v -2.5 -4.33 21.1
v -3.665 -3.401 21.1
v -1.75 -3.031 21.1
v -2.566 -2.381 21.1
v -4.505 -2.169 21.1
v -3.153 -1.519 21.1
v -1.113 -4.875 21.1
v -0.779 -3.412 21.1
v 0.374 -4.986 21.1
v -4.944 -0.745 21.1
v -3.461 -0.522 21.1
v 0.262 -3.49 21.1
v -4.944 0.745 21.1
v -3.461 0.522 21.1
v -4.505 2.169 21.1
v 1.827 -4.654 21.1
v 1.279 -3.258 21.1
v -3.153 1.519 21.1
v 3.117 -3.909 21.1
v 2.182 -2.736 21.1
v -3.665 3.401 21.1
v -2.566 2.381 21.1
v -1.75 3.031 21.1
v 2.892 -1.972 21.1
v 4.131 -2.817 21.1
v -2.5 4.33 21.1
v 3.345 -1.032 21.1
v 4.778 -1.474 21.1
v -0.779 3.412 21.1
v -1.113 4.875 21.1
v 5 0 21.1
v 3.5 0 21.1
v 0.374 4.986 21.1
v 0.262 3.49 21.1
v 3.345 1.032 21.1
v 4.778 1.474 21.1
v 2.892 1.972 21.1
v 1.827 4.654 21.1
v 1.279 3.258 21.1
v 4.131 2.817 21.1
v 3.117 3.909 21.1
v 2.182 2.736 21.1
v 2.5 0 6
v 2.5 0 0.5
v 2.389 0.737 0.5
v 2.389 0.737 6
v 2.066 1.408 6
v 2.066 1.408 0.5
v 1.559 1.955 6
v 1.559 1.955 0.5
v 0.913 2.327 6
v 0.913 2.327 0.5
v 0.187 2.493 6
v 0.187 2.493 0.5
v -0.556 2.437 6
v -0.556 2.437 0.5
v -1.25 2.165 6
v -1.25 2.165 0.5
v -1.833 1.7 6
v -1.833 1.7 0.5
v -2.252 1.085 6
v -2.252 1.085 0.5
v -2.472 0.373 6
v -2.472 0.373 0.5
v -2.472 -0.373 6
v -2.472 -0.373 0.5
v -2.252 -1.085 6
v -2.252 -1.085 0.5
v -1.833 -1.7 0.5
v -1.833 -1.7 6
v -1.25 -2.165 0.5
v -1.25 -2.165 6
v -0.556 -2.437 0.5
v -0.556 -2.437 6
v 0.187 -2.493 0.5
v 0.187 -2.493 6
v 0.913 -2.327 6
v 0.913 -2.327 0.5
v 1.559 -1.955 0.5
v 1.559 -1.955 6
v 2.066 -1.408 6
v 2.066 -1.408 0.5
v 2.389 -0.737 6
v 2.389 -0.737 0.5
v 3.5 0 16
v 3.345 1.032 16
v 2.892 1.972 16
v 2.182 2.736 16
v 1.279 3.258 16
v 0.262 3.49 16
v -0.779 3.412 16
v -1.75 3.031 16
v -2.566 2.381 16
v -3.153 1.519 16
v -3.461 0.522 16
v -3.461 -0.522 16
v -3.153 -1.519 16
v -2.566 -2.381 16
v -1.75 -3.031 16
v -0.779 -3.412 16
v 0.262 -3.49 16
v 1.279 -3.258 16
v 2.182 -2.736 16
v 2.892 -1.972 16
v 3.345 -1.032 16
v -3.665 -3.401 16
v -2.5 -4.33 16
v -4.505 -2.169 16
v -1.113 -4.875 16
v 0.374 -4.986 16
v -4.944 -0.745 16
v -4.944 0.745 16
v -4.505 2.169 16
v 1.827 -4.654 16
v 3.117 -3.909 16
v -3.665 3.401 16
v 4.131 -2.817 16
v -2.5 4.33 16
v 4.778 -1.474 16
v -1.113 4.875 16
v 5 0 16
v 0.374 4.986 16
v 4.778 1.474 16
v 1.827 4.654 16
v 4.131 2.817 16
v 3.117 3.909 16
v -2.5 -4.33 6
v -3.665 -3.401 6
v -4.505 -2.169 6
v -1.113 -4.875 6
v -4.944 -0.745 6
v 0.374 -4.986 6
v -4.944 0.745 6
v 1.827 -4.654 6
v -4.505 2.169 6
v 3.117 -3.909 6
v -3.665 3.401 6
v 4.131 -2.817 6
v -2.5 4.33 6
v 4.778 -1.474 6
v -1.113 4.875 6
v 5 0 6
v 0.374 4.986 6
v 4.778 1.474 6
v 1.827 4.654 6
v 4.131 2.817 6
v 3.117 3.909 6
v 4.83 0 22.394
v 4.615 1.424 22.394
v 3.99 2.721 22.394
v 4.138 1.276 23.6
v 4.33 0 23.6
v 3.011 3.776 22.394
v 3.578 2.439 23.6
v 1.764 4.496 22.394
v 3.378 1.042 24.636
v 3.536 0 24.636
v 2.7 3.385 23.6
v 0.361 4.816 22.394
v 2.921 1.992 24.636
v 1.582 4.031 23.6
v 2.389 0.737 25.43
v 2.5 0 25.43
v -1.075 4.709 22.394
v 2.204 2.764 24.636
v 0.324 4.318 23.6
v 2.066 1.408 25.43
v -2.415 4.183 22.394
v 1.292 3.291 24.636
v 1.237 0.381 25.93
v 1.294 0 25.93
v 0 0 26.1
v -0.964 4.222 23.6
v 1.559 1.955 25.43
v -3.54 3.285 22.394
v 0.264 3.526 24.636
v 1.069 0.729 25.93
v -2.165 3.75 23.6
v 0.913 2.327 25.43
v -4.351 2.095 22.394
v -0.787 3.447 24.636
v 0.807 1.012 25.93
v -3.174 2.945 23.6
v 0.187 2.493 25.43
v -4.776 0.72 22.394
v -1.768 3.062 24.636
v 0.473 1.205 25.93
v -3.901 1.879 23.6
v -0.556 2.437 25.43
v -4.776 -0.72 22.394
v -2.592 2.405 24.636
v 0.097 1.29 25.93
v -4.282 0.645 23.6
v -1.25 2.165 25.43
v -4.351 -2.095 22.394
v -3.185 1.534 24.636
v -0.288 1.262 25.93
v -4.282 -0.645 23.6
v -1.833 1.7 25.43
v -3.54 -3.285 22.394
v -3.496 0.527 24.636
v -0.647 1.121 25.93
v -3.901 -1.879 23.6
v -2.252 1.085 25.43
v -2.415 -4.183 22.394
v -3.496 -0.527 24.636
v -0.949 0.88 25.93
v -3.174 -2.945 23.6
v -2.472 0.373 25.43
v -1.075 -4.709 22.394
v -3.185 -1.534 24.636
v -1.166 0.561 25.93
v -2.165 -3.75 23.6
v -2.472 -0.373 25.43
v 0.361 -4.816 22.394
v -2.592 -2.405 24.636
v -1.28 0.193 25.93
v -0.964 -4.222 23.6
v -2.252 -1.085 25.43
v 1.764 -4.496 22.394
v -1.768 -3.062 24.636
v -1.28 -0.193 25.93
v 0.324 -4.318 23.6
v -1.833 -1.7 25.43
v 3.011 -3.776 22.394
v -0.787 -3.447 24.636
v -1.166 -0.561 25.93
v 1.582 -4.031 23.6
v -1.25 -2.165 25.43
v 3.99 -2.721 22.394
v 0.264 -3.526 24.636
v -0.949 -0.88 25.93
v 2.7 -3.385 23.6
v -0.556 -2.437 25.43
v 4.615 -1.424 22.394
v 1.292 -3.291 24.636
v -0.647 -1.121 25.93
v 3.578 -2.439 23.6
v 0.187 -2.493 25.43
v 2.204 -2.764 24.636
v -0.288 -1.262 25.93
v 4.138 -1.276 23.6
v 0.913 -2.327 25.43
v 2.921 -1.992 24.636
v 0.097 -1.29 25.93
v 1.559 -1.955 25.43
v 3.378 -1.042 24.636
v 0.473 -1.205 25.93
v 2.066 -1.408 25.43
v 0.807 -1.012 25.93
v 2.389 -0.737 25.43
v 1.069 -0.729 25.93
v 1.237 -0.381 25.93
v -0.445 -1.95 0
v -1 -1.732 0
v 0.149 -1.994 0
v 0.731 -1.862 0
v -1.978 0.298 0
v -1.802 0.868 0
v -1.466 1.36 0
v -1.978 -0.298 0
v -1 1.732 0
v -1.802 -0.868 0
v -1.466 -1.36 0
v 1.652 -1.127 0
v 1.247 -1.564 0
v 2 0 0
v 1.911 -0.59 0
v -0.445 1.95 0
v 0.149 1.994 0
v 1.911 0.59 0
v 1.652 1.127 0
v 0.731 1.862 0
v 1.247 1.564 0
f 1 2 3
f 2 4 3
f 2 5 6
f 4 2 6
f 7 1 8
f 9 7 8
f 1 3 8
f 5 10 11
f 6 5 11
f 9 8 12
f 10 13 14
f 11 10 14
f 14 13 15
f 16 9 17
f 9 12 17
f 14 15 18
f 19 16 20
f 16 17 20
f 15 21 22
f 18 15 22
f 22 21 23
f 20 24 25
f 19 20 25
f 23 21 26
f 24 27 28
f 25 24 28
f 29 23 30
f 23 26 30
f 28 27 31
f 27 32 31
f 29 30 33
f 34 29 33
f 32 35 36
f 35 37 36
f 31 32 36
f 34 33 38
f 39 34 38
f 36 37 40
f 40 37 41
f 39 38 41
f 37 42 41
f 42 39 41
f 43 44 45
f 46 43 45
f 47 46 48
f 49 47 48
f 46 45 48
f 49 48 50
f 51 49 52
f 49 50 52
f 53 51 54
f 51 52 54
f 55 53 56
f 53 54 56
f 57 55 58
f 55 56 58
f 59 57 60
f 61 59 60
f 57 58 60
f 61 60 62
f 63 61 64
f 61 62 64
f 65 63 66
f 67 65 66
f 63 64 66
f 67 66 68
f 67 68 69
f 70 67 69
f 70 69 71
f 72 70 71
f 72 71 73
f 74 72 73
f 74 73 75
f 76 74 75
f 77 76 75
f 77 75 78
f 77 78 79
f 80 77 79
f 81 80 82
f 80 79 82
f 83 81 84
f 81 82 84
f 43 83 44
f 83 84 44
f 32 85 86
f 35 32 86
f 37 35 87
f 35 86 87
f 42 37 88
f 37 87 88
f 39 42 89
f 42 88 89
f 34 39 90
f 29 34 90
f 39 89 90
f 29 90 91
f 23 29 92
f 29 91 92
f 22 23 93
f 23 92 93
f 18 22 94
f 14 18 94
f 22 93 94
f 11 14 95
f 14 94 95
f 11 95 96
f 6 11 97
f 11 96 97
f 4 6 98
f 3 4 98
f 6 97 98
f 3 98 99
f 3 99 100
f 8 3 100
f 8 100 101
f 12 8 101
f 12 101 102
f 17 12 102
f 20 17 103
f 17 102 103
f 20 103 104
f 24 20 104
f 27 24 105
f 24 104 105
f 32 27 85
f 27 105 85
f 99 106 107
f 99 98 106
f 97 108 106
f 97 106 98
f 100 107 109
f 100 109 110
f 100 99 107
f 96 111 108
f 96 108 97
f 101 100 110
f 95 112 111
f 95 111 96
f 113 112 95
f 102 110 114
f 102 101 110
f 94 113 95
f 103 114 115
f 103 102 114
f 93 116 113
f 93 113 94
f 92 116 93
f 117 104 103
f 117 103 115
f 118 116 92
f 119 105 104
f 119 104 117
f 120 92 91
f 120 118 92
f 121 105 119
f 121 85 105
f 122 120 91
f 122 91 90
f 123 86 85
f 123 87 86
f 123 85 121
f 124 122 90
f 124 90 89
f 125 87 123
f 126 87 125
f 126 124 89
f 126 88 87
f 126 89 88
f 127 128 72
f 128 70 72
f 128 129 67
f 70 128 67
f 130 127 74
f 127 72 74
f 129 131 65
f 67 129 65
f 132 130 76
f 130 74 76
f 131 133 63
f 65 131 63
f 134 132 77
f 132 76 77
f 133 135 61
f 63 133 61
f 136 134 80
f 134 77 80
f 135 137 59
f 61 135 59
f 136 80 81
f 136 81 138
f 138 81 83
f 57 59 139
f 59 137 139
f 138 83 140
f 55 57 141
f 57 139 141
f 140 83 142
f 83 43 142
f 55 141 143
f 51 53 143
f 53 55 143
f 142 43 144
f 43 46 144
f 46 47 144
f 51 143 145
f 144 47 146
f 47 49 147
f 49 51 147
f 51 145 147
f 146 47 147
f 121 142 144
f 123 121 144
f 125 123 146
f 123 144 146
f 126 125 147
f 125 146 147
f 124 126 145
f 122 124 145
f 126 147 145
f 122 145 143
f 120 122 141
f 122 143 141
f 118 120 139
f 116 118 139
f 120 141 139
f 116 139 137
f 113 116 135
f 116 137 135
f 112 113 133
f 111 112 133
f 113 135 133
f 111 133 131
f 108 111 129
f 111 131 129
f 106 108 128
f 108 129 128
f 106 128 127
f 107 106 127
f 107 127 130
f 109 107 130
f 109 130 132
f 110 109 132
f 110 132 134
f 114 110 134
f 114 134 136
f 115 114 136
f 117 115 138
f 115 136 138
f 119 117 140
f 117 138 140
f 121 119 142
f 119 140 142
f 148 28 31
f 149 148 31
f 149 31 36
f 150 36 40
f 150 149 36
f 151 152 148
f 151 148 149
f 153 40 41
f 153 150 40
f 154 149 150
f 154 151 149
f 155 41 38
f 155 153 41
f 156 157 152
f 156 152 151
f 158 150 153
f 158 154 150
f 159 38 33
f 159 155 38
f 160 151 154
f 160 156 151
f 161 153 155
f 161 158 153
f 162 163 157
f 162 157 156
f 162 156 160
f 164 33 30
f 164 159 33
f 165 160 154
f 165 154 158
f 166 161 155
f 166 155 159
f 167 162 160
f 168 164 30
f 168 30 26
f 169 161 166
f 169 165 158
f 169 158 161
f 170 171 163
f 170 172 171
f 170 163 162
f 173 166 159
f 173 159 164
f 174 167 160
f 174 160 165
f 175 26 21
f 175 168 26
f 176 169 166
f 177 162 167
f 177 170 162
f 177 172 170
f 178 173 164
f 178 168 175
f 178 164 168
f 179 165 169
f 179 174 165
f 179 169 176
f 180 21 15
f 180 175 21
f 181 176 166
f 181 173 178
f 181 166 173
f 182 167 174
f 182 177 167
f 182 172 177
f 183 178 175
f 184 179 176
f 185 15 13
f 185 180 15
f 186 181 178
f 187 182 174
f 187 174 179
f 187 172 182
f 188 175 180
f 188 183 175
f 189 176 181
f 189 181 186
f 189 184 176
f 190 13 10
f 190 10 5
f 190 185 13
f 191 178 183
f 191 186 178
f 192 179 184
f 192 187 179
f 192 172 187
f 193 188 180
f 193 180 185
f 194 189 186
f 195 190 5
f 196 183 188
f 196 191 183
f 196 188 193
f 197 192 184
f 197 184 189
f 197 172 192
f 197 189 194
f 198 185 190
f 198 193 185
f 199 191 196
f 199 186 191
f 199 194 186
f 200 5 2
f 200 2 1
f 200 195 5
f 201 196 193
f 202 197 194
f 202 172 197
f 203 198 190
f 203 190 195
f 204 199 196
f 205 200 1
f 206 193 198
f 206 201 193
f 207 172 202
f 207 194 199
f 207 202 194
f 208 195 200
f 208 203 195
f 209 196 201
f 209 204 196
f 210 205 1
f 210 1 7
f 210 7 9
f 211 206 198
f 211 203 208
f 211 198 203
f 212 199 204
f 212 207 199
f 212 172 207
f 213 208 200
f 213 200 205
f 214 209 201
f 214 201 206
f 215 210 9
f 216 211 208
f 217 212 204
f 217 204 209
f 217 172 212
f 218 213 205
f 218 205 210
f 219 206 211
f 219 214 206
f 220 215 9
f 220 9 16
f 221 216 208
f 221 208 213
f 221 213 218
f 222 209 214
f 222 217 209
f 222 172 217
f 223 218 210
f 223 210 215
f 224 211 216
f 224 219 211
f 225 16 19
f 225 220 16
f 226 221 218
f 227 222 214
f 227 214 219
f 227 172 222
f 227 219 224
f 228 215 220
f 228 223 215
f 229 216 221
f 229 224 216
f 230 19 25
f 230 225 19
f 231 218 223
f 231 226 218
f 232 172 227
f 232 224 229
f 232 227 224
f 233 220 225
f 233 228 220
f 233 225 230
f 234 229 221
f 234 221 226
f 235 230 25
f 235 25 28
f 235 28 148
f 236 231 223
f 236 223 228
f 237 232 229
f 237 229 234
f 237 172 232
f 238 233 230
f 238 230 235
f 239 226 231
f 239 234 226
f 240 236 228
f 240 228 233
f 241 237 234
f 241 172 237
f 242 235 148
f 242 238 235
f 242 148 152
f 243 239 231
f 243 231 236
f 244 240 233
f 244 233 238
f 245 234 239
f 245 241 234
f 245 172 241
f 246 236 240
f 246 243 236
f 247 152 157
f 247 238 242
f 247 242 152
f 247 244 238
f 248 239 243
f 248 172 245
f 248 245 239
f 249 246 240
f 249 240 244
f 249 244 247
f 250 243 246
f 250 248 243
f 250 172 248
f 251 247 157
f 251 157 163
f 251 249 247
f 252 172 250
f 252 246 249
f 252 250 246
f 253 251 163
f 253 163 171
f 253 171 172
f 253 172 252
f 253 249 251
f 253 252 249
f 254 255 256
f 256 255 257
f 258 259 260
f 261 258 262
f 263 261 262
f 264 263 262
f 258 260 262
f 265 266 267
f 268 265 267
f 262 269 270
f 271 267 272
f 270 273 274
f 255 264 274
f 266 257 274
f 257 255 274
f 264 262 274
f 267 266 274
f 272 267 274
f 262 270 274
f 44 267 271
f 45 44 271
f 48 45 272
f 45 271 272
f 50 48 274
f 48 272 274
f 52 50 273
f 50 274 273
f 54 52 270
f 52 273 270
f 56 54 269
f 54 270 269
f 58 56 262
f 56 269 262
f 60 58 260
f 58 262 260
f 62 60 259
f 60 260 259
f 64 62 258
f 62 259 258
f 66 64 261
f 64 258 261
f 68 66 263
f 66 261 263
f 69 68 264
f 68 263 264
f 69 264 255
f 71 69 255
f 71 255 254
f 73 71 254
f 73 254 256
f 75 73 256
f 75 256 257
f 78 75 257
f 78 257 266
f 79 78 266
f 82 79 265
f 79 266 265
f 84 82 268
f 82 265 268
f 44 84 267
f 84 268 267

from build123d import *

# Parameters (mm, degrees)
F0_R     = 2.5
F1_DEPTH = 6
F2_R     = 5
F3_DEPTH = 10
F4_R     = 3.5
F5_DEPTH = 5.1
F6_R     = 5
F7_DEPTH = 5
F8_SIZE  = 0.5
F9_R     = 4.99999


# Not quite as in the source:
# - a fillet or chamfer is up to 0.001 mm smaller than in the source, because OpenCascade refuses the exact size


with BuildPart() as f1:
    # F0 (on Top) → F1 (new body)
    with BuildSketch(Plane.XY):
        Circle(F0_R)
    extrude(amount=F1_DEPTH)

    # F2 (on face) → F3 (join)
    with BuildSketch(Plane.XY.offset(6)):
        Circle(F2_R)
    extrude(amount=F3_DEPTH)

    # F4 (on face) → F5 (join)
    with BuildSketch(Plane.XY.offset(16)):
        Circle(F4_R)
    extrude(amount=F5_DEPTH)

    # F6 (on face) → F7 (join)
    with BuildSketch(Plane.XY.offset(21.1)):
        Circle(F6_R)
    extrude(amount=F7_DEPTH)

    # F8
    f8_edges = [f1.edges().sort_by_distance(p)[0] for p in [
        (-2.5, 0, 0),
    ]]
    chamfer(f8_edges, length=F8_SIZE)

    # F9 (radius 5 in the source; OpenCascade refuses exactly that, so slightly less here)
    f9_edges = [f1.edges().sort_by_distance(p)[0] for p in [
        (-5, 0, 26.1),
    ]]
    fillet(f9_edges, radius=F9_R)


solid = f1.part
